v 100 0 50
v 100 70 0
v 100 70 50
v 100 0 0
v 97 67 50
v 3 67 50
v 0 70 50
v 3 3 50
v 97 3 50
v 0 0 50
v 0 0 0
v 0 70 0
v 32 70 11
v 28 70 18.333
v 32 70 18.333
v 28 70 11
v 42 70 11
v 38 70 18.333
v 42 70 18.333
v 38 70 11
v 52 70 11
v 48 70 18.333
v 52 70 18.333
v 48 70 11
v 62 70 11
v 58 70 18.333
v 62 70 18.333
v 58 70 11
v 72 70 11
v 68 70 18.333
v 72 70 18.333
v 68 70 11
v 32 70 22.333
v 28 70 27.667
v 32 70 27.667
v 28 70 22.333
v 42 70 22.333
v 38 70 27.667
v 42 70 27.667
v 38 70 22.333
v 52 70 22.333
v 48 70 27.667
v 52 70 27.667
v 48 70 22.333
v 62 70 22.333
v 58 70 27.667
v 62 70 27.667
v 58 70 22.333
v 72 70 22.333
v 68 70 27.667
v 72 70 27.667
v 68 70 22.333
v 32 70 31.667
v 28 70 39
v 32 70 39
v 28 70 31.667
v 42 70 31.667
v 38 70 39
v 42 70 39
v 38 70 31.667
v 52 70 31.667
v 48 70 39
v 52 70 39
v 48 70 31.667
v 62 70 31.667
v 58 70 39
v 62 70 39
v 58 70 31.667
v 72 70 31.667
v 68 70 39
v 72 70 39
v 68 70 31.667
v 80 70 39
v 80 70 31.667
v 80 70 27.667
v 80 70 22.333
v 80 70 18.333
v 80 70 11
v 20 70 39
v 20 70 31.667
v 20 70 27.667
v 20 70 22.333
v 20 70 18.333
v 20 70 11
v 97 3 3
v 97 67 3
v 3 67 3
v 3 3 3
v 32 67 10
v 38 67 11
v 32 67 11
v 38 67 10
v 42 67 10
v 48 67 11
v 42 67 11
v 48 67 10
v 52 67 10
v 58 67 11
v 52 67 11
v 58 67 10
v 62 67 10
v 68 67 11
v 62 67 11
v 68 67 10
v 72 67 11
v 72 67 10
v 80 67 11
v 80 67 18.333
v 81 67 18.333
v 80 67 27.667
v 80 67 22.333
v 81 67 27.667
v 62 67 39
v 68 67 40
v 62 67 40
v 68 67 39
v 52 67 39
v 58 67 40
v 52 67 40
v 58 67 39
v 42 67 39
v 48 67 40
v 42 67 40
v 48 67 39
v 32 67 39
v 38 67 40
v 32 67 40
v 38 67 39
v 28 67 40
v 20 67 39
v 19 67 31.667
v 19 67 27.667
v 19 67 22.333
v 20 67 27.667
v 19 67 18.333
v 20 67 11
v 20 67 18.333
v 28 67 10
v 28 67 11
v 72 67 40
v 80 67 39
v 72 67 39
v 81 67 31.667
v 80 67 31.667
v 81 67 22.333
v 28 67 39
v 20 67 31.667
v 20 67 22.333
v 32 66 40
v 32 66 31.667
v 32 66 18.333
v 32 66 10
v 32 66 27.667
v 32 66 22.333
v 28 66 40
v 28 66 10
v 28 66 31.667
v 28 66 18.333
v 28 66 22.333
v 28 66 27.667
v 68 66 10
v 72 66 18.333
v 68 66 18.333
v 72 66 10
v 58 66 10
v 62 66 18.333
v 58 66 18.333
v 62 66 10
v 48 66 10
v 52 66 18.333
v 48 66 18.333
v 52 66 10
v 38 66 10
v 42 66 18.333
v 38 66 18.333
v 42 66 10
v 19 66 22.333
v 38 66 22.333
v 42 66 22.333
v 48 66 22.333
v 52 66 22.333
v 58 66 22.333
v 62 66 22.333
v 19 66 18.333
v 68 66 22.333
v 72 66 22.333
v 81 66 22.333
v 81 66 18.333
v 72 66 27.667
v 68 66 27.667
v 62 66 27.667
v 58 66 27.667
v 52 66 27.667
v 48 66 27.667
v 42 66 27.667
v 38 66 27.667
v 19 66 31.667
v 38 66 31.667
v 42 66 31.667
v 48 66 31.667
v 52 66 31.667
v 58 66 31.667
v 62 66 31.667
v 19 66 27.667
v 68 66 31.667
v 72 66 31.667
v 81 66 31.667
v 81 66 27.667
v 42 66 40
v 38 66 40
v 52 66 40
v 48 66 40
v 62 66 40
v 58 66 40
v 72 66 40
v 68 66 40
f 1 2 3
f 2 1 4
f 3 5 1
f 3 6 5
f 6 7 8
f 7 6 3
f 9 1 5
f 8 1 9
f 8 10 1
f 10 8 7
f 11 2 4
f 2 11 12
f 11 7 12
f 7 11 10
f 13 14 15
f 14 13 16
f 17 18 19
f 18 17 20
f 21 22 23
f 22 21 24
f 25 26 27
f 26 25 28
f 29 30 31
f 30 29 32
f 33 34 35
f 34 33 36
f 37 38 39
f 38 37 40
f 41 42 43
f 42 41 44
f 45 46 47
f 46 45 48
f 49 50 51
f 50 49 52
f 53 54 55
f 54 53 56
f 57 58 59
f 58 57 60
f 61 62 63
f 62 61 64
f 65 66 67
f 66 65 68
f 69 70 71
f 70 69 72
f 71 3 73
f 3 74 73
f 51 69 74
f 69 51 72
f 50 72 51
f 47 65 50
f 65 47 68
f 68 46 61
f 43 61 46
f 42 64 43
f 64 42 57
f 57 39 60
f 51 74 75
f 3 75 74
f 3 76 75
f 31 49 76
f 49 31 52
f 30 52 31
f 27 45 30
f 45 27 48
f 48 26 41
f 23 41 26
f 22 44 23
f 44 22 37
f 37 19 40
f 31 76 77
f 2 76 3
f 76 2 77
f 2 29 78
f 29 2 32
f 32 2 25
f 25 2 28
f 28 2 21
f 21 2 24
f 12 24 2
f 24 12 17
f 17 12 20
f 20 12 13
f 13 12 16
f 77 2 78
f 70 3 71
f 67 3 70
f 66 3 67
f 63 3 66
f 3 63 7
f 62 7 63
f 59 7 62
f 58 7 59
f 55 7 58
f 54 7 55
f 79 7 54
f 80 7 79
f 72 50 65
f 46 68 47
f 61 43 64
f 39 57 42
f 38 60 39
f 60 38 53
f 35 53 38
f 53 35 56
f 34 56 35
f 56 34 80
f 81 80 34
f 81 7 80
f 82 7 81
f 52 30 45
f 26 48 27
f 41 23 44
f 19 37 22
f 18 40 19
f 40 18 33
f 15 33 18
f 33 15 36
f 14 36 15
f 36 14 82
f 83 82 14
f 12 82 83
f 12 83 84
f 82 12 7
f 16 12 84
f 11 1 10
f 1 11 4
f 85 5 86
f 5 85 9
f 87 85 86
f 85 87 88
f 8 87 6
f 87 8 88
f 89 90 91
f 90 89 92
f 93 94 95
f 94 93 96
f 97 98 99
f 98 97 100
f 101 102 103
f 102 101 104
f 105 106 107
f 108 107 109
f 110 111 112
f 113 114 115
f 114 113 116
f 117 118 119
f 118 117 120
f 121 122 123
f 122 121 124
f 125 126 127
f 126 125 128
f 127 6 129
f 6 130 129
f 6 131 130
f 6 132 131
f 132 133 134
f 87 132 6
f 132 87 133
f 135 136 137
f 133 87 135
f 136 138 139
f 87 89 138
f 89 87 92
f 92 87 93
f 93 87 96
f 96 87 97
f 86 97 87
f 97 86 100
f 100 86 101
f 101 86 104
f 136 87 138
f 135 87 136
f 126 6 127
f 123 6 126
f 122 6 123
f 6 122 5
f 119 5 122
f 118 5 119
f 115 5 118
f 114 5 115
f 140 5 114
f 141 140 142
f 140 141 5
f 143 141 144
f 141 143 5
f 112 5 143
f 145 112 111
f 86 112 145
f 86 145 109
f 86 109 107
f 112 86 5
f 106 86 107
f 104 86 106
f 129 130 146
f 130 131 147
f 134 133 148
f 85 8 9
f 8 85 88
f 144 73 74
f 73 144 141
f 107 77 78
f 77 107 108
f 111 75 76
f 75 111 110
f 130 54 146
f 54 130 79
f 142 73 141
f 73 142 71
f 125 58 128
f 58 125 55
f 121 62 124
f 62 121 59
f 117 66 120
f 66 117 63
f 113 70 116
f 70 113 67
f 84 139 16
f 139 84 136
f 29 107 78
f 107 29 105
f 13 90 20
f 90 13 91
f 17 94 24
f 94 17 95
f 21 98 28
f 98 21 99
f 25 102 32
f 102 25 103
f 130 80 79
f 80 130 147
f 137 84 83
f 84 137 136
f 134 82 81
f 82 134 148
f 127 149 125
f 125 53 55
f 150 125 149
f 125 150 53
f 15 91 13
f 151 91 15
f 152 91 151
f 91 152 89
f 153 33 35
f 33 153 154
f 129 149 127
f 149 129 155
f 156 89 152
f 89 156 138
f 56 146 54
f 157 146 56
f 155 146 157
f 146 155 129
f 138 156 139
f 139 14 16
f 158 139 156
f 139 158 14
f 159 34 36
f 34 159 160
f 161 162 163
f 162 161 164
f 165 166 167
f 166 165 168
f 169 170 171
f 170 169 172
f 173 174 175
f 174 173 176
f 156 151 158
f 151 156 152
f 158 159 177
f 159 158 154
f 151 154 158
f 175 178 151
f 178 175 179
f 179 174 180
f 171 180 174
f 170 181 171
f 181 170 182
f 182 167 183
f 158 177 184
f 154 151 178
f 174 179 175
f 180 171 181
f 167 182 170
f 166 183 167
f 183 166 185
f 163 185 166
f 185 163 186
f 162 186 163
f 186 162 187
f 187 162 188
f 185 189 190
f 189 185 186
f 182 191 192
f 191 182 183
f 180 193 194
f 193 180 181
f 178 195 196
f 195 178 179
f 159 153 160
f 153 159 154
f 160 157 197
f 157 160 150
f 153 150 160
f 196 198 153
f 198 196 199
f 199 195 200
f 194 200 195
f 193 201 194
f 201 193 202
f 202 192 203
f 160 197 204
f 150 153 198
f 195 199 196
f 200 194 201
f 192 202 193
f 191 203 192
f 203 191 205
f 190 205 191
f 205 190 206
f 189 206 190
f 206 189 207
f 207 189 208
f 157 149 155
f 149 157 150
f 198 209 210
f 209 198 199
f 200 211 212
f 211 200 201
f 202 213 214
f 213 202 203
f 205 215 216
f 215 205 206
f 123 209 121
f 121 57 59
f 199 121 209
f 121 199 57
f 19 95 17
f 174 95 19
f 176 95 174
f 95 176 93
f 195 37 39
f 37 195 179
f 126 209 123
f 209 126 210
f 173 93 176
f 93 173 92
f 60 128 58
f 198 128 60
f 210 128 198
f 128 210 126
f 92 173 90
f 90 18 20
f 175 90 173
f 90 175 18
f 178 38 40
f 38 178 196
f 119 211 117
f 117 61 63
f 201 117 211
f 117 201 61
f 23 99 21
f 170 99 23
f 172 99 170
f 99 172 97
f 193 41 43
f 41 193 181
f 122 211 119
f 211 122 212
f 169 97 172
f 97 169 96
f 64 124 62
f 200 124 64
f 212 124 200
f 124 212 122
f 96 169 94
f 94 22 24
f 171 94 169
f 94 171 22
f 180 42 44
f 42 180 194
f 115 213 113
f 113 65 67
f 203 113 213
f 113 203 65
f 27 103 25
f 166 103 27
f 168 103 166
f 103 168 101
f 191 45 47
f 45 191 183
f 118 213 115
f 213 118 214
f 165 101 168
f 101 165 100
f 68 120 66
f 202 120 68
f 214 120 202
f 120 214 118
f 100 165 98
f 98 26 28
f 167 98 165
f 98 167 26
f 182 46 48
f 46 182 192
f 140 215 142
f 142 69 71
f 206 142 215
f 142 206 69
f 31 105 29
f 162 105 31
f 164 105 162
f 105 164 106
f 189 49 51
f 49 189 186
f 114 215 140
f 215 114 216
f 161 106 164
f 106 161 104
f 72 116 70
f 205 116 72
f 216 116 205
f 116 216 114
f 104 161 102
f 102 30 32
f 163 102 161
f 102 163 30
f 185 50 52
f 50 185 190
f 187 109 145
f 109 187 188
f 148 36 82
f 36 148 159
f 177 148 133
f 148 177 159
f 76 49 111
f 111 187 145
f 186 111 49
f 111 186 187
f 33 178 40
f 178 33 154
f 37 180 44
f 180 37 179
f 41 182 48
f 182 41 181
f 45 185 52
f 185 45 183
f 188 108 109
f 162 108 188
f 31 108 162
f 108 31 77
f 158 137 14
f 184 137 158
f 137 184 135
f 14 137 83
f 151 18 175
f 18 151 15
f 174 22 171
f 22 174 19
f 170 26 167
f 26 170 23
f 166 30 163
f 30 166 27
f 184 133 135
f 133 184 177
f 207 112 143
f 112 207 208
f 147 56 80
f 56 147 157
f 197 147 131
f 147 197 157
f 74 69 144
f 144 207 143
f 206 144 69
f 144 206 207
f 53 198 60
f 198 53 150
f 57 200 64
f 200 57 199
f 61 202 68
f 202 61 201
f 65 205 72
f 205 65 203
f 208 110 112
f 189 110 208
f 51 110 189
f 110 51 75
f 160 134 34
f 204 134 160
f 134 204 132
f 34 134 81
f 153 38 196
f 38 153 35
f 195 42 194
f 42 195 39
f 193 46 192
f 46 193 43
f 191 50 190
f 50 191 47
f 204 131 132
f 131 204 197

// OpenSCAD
$fn = 32;

// ----------------------------------------------------------------------
// Vent box: crossgrid enclosure
// ----------------------------------------------------------------------

// --- parameters (mm) ---
box_l = 100;              // box length, X
box_w = 70;               // box width, Y
box_h = 50;               // box height, Z
wall_t = 3;               // shell wall thickness
win_l = 60;               // vent window width, X
win_h = 28;               // vent window height, Z
bar_w = 4;                // grid bar width
n_v = 5;                  // vertical bar count
n_h = 2;                  // horizontal bar count
fit_tol = 0.05;           // tolerance for press fits, mm
free_tol = 0.2;           // tolerance for clearance fits, mm

win_z0 = (box_h - win_h) / 2;  // window lower edge Z
v_step = win_l / (n_v + 1);  // vertical bar step
h_step = win_h / (n_h + 1);  // horizontal bar step

difference() {
  union() {
    difference() {
      cube([box_l, box_w, box_h]);
  translate([wall_t, wall_t, wall_t])
    cube([box_l - 2 * wall_t, box_w - 2 * wall_t, box_h]);
  translate([(box_l - win_l) / 2, box_w - wall_t - 1, win_z0])
    cube([win_l, wall_t + 2, win_h]);
    }
    for (i = [1 : n_v])
      translate([(box_l - win_l) / 2 + i * v_step - bar_w / 2,
                 box_w - wall_t - 1, win_z0 - 1])
        cube([bar_w, wall_t + 1, win_h + 2]);
    for (i = [1 : n_h])
      translate([(box_l - win_l) / 2 - 1, box_w - wall_t - 1,
                 win_z0 + i * h_step - bar_w / 2])
        cube([win_l + 2, wall_t + 1, bar_w]);
  }
}
